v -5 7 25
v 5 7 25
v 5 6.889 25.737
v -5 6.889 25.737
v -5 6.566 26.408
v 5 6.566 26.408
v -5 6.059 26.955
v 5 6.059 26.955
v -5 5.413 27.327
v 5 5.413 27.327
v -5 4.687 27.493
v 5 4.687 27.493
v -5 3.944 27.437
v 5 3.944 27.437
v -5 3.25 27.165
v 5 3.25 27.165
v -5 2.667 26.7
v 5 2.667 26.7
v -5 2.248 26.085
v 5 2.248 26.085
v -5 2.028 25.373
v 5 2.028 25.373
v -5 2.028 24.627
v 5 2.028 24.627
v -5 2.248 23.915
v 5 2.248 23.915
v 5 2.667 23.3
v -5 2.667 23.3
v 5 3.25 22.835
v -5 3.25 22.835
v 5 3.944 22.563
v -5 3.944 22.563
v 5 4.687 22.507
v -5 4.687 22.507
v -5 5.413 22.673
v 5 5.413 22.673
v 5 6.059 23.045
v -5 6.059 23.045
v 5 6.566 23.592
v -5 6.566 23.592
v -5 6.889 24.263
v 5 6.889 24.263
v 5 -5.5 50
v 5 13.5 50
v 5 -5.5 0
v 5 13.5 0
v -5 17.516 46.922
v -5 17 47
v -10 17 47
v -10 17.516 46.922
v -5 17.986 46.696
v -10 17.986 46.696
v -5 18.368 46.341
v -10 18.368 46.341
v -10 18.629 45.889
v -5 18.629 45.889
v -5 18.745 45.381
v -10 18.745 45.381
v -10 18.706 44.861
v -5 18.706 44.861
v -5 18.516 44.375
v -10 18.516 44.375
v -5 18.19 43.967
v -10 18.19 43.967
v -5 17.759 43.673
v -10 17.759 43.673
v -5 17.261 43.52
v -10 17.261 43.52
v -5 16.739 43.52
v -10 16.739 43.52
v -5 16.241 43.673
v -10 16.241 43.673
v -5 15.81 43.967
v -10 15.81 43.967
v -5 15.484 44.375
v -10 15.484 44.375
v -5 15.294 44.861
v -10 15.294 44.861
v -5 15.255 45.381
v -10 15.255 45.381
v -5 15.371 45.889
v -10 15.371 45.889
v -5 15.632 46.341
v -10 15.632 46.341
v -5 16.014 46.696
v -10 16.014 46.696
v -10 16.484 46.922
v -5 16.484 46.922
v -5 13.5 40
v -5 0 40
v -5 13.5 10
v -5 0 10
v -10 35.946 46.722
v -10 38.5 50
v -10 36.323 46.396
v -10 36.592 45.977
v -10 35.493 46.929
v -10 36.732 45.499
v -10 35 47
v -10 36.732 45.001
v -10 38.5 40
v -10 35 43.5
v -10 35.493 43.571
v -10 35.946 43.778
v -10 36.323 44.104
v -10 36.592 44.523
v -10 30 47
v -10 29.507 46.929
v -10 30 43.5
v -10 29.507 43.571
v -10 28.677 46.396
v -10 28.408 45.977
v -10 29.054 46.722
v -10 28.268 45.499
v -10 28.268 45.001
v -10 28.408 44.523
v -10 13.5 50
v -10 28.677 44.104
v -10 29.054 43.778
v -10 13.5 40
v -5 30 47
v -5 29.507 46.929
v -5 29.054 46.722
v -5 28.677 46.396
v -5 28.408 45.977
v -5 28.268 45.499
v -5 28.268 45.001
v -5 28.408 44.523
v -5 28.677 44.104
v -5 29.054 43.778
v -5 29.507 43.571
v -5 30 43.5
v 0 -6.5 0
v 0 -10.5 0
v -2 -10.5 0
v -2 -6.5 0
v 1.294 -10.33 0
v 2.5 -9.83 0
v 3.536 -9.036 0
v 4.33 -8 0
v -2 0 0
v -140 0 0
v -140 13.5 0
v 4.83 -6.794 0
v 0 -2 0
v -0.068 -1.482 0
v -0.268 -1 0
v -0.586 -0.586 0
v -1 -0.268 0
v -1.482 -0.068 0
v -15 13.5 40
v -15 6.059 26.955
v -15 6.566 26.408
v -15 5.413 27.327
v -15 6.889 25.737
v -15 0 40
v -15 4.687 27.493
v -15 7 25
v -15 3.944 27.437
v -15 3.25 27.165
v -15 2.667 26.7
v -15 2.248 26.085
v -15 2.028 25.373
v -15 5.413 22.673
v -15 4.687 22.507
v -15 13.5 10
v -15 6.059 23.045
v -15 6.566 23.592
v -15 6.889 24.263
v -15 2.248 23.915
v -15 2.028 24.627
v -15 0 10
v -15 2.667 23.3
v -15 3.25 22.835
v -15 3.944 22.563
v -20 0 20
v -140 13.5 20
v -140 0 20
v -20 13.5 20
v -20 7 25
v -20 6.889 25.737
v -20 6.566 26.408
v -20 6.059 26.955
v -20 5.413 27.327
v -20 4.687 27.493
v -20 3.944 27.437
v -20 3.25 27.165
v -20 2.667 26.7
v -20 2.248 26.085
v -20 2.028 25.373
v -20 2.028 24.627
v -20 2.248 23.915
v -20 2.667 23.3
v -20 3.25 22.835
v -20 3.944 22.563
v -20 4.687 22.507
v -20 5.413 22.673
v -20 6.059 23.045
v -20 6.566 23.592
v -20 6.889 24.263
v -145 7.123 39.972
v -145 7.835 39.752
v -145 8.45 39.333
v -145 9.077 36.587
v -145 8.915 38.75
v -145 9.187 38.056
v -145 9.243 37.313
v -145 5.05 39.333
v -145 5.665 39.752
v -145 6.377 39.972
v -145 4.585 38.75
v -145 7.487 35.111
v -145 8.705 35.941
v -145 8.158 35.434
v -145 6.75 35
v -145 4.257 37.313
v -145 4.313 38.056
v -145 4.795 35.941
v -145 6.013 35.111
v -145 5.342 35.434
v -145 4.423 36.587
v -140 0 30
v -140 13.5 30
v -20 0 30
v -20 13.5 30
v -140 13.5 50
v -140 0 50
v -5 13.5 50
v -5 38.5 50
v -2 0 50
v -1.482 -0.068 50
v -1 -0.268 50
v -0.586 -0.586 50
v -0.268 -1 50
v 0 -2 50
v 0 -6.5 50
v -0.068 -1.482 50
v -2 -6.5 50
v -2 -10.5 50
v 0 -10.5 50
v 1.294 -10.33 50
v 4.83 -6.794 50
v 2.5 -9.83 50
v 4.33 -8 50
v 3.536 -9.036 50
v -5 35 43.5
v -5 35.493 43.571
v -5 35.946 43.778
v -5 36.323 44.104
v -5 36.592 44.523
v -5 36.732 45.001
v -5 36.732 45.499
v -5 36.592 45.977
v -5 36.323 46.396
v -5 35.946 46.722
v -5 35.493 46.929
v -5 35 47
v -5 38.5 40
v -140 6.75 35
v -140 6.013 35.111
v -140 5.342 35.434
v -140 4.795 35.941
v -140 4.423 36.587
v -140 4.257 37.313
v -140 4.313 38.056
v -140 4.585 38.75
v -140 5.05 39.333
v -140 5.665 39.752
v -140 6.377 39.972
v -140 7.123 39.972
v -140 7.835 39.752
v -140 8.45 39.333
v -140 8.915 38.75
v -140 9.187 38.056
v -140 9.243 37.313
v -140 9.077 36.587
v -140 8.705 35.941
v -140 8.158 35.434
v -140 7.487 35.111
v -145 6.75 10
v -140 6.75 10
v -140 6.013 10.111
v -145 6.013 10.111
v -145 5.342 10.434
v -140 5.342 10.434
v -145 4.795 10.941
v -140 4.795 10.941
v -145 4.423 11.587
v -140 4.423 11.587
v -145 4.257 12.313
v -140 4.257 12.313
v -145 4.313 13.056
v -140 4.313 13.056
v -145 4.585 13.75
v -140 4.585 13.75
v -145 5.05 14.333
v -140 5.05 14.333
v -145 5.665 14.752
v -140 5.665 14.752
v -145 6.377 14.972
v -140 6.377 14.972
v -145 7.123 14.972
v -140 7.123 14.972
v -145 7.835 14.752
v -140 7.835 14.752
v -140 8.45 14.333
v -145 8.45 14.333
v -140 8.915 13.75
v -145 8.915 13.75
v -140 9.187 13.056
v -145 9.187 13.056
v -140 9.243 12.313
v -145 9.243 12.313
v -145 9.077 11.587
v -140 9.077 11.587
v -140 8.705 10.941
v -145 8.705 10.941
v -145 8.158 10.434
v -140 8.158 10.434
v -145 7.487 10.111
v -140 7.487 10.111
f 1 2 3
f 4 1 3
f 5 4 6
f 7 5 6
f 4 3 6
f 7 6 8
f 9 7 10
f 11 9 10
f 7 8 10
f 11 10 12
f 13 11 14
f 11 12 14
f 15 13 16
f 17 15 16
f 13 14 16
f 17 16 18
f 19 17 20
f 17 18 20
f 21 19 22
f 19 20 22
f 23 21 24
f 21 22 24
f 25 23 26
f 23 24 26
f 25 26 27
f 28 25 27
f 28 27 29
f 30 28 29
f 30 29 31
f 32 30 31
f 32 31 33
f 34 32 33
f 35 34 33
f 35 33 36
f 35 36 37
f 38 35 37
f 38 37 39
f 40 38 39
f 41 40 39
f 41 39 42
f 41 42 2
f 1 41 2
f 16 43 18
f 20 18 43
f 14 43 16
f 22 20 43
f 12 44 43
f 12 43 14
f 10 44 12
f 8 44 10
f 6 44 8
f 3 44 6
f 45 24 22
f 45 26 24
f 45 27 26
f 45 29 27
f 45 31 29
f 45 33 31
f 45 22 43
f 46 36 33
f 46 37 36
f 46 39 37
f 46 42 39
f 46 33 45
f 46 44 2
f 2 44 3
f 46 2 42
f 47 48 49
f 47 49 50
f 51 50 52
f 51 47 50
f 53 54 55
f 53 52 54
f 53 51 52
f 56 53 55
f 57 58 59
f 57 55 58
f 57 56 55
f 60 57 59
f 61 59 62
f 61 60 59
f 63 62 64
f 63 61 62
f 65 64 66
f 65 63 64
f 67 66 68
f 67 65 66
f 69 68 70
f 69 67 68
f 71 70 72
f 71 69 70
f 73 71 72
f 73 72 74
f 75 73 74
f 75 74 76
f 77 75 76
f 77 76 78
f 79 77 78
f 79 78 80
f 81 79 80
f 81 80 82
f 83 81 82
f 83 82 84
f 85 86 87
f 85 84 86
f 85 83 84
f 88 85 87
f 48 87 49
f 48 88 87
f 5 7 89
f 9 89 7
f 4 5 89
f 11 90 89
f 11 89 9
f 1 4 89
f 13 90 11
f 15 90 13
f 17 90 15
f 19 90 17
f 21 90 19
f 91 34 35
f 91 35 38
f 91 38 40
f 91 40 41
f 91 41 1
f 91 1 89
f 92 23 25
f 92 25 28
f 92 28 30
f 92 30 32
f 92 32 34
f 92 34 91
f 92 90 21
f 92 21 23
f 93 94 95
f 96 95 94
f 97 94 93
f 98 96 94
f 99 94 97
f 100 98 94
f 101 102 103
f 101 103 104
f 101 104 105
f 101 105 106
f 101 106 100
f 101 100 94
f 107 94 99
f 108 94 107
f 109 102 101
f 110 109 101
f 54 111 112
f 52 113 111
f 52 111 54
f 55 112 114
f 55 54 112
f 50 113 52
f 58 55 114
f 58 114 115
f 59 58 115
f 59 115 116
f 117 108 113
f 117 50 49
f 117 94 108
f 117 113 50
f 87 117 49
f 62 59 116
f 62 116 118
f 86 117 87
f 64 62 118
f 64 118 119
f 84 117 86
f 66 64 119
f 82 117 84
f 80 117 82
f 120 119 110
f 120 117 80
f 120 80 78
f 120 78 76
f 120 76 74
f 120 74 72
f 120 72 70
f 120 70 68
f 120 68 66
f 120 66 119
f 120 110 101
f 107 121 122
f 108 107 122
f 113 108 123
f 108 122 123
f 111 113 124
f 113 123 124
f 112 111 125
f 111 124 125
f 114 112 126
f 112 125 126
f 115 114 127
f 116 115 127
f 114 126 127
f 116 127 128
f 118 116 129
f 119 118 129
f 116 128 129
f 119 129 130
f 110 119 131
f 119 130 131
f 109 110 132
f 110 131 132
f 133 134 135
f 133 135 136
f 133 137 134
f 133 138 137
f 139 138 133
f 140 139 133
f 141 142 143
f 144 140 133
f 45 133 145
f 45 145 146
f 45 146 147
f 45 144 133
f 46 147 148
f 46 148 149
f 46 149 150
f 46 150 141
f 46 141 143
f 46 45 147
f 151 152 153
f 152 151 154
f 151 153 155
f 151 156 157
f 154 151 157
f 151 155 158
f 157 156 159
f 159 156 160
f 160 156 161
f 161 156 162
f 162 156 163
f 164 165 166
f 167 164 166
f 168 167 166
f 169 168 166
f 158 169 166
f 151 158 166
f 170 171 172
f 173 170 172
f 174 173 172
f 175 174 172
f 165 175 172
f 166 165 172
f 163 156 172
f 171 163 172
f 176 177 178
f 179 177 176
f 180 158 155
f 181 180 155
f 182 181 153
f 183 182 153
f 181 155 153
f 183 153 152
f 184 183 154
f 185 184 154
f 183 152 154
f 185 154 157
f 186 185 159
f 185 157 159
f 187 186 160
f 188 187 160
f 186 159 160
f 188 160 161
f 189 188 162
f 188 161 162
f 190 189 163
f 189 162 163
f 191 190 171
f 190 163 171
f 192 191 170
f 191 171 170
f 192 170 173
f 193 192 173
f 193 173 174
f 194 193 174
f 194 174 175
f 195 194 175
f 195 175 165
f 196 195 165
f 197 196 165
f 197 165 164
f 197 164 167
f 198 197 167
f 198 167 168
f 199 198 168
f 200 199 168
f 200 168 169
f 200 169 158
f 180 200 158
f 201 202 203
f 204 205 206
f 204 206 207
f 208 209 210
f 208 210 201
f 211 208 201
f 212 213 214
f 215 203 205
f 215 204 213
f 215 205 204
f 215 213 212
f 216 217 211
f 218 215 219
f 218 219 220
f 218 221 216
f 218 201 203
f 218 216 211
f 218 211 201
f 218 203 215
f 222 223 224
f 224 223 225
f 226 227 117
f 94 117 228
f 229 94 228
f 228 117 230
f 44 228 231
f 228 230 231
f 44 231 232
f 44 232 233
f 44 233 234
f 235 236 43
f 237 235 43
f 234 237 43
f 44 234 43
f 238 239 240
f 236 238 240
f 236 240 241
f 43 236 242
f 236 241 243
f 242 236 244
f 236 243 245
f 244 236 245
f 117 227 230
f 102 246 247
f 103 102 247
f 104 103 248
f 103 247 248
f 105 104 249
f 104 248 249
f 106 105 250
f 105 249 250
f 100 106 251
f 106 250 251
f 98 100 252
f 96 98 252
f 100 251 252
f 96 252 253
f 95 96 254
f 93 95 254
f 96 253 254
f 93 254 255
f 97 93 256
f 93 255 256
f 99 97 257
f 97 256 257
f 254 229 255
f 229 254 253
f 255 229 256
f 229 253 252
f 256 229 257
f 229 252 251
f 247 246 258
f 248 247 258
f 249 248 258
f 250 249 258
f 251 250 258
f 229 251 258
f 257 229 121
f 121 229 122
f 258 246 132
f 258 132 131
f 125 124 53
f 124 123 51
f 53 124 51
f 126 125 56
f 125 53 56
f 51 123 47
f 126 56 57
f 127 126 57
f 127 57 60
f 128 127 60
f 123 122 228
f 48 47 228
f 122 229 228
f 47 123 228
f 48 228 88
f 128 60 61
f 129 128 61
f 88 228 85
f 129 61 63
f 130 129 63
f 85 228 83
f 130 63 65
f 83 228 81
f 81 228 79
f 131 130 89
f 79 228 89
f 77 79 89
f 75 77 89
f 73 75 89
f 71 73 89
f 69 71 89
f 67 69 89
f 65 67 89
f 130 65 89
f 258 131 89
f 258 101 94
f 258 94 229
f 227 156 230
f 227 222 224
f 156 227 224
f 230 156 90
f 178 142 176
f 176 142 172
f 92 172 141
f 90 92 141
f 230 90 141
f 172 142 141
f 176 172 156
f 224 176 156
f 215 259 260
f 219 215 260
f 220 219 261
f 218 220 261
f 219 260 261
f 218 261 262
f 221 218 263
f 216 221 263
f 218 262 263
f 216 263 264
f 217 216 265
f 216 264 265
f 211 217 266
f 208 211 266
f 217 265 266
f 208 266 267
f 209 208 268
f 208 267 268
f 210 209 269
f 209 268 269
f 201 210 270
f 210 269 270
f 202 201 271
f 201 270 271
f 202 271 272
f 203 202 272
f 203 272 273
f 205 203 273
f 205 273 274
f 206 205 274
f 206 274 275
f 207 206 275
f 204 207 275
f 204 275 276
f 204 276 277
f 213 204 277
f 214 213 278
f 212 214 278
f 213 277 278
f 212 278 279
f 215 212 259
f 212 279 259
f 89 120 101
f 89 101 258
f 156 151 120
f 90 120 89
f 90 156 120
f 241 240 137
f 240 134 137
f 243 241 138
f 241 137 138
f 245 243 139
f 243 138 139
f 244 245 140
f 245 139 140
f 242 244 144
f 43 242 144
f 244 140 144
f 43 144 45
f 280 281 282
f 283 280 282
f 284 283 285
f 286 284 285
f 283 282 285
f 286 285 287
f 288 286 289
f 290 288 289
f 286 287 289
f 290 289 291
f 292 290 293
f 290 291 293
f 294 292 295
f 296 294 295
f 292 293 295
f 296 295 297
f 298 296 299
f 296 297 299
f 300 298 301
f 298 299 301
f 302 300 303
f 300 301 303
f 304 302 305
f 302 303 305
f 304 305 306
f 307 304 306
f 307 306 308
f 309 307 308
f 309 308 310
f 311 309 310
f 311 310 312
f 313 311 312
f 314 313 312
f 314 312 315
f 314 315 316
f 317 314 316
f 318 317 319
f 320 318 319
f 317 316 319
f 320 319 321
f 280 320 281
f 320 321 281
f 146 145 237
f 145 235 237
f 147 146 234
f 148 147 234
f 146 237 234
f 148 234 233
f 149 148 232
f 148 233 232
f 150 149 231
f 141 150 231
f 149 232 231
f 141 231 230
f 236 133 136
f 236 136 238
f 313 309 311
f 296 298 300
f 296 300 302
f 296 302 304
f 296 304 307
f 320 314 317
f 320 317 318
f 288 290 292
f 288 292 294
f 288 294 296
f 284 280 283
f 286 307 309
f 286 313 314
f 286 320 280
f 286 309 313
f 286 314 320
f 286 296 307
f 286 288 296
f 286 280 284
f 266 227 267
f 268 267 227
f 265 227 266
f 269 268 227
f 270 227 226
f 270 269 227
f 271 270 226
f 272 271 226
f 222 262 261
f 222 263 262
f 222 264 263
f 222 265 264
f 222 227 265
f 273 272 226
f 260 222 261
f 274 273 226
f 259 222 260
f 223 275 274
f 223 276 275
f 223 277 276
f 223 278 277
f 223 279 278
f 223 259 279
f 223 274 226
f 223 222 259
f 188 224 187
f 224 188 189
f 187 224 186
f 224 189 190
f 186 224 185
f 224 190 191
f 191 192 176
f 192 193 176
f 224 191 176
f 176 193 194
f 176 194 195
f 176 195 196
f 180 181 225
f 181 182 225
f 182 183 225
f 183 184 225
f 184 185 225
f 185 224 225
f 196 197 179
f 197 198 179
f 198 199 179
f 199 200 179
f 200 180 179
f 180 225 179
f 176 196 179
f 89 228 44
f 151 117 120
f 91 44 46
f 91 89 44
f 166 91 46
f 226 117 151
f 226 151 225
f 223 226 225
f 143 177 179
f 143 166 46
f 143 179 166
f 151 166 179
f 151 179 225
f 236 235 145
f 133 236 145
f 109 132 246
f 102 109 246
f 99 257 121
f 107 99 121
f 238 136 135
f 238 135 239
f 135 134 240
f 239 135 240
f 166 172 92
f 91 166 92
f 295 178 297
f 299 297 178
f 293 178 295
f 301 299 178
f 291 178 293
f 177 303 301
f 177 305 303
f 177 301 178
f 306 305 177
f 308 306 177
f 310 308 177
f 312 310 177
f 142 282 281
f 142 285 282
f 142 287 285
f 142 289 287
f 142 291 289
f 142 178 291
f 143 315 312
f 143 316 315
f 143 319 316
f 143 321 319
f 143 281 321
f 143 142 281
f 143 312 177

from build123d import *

# Parameters (mm, degrees)
SKETCH1_W               = 140
SKETCH1_H               = 13.5
BOSS_EXTRUDE1_DEPTH     = 50
SKETCH2_R               = 2.5
BOSS_EXTRUDE2_DEPTH     = 5
SKETCH6_W               = 50
SKETCH6_H               = 24
BOSS_EXTRUDE4_DEPTH     = 5
CUT_EXTRUDE1_DEPTH      = 156.244967712
CUT_EXTRUDE1_DEPTH_BACK = 156.244967712
SKETCH4_W               = 10
SKETCH4_H               = 30
SKETCH7_R               = 2.5
CUT_EXTRUDE3_DEPTH      = 35
SKETCH8_W               = 50
SKETCH8_H               = 4
BOSS_EXTRUDE5_DEPTH     = 2
SKETCH9_W               = 120
SKETCH9_H               = 10
CUT_EXTRUDE4_DEPTH      = 15
SKETCH10_W              = 5
SKETCH10_H              = 10
BOSS_EXTRUDE6_DEPTH     = 25
CUT_EXTRUDE5_DEPTH      = 150.020971678
CUT_EXTRUDE5_DEPTH_BACK = 150.020971678
SKETCH13_R              = 1.75
FILLET1_R               = 2
FILLET2_R               = 5


with BuildPart() as part:
    # Sketch1 → Boss-Extrude1 (new body)
    with BuildSketch(Plane.XY):
        with Locations((-70, 6.75)):
            Rectangle(SKETCH1_W, SKETCH1_H)
    extrude(amount=BOSS_EXTRUDE1_DEPTH)

    # Sketch2 → Boss-Extrude2 (add)
    with BuildSketch(Plane.ZY.offset(140)):
        with Locations(Location((12.5, 6.75, 0), (0, 0, 180))):
            Circle(SKETCH2_R)
        with Locations(Location((37.5, 6.75, 0), (0, 0, 180))):
            Circle(SKETCH2_R)
    extrude(amount=BOSS_EXTRUDE2_DEPTH)

    # Sketch6 → Boss-Extrude4 (add)
    with BuildSketch(Plane(origin=(0, 0, 0), x_dir=(0, 0, -1), z_dir=(1, 0, 0))):
        with Locations((-25, 1.5)):
            Rectangle(SKETCH6_W, SKETCH6_H)
    extrude(amount=BOSS_EXTRUDE4_DEPTH)

    # Sketch4 → Cut-Extrude1 (cut, two sides: drawn at the far end of the back side and taken through both)
    with BuildSketch(Plane(origin=(0, 13.5, 0), x_dir=(1, 0, 0), z_dir=(0, 1, 0)).offset(-CUT_EXTRUDE1_DEPTH_BACK)):
        with Locations((-10, -25)):
            Rectangle(SKETCH4_W, SKETCH4_H)
    extrude(amount=CUT_EXTRUDE1_DEPTH + CUT_EXTRUDE1_DEPTH_BACK, mode=Mode.SUBTRACT)

    # Sketch7 → Cut-Extrude3 (cut)
    with BuildSketch(Plane(origin=(5, 0, 0), x_dir=(0, 0, -1), z_dir=(1, 0, 0))):
        with Locations(Location((-25, 4.5, 0), (0, 0, 90))):
            Circle(SKETCH7_R)
    extrude(amount=-CUT_EXTRUDE3_DEPTH, mode=Mode.SUBTRACT)

    # Sketch8 → Boss-Extrude5 (add)
    with BuildSketch(Plane.ZY):
        with Locations((25, -8.5)):
            Rectangle(SKETCH8_W, SKETCH8_H)
    extrude(amount=BOSS_EXTRUDE5_DEPTH)

    # Sketch9 → Cut-Extrude4 (cut)
    with BuildSketch(Plane(origin=(0, 13.5, 0), x_dir=(1, 0, 0), z_dir=(0, 1, 0))):
        with Locations((-80, -25)):
            Rectangle(SKETCH9_W, SKETCH9_H)
    extrude(amount=-CUT_EXTRUDE4_DEPTH, mode=Mode.SUBTRACT)

    # Sketch10 → Boss-Extrude6 (add)
    with BuildSketch(Plane(origin=(0, 13.5, 0), x_dir=(1, 0, 0), z_dir=(0, 1, 0))):
        with Locations((-7.5, -45)):
            Rectangle(SKETCH10_W, SKETCH10_H)
    extrude(amount=BOSS_EXTRUDE6_DEPTH)

    # Sketch13 → Cut-Extrude5 (cut, two sides: drawn at the far end of the back side and taken through both)
    with BuildSketch(Plane.ZY.offset(10).offset(-CUT_EXTRUDE5_DEPTH_BACK)):
        with Locations((45.25, 17)):
            Circle(SKETCH13_R)
        with BuildLine():
            Line((43.5, 30), (43.5, 35))
            ThreePointArc((43.5, 35), (45.25, 36.75), (47, 35))
            Line((47, 35), (47, 30))
            ThreePointArc((47, 30), (45.25, 28.25), (43.5, 30))
        make_face()
    extrude(amount=CUT_EXTRUDE5_DEPTH + CUT_EXTRUDE5_DEPTH_BACK, mode=Mode.SUBTRACT)

    # Fillet1
    fillet1_edges = [part.edges().sort_by_distance(p)[0] for p in [
        (0, 0, 25),
    ]]
    fillet(fillet1_edges, radius=FILLET1_R)

    # Fillet2
    fillet2_edges = [part.edges().sort_by_distance(p)[0] for p in [
        (5, -10.5, 25),
    ]]
    fillet(fillet2_edges, radius=FILLET2_R)


solid = part.part
